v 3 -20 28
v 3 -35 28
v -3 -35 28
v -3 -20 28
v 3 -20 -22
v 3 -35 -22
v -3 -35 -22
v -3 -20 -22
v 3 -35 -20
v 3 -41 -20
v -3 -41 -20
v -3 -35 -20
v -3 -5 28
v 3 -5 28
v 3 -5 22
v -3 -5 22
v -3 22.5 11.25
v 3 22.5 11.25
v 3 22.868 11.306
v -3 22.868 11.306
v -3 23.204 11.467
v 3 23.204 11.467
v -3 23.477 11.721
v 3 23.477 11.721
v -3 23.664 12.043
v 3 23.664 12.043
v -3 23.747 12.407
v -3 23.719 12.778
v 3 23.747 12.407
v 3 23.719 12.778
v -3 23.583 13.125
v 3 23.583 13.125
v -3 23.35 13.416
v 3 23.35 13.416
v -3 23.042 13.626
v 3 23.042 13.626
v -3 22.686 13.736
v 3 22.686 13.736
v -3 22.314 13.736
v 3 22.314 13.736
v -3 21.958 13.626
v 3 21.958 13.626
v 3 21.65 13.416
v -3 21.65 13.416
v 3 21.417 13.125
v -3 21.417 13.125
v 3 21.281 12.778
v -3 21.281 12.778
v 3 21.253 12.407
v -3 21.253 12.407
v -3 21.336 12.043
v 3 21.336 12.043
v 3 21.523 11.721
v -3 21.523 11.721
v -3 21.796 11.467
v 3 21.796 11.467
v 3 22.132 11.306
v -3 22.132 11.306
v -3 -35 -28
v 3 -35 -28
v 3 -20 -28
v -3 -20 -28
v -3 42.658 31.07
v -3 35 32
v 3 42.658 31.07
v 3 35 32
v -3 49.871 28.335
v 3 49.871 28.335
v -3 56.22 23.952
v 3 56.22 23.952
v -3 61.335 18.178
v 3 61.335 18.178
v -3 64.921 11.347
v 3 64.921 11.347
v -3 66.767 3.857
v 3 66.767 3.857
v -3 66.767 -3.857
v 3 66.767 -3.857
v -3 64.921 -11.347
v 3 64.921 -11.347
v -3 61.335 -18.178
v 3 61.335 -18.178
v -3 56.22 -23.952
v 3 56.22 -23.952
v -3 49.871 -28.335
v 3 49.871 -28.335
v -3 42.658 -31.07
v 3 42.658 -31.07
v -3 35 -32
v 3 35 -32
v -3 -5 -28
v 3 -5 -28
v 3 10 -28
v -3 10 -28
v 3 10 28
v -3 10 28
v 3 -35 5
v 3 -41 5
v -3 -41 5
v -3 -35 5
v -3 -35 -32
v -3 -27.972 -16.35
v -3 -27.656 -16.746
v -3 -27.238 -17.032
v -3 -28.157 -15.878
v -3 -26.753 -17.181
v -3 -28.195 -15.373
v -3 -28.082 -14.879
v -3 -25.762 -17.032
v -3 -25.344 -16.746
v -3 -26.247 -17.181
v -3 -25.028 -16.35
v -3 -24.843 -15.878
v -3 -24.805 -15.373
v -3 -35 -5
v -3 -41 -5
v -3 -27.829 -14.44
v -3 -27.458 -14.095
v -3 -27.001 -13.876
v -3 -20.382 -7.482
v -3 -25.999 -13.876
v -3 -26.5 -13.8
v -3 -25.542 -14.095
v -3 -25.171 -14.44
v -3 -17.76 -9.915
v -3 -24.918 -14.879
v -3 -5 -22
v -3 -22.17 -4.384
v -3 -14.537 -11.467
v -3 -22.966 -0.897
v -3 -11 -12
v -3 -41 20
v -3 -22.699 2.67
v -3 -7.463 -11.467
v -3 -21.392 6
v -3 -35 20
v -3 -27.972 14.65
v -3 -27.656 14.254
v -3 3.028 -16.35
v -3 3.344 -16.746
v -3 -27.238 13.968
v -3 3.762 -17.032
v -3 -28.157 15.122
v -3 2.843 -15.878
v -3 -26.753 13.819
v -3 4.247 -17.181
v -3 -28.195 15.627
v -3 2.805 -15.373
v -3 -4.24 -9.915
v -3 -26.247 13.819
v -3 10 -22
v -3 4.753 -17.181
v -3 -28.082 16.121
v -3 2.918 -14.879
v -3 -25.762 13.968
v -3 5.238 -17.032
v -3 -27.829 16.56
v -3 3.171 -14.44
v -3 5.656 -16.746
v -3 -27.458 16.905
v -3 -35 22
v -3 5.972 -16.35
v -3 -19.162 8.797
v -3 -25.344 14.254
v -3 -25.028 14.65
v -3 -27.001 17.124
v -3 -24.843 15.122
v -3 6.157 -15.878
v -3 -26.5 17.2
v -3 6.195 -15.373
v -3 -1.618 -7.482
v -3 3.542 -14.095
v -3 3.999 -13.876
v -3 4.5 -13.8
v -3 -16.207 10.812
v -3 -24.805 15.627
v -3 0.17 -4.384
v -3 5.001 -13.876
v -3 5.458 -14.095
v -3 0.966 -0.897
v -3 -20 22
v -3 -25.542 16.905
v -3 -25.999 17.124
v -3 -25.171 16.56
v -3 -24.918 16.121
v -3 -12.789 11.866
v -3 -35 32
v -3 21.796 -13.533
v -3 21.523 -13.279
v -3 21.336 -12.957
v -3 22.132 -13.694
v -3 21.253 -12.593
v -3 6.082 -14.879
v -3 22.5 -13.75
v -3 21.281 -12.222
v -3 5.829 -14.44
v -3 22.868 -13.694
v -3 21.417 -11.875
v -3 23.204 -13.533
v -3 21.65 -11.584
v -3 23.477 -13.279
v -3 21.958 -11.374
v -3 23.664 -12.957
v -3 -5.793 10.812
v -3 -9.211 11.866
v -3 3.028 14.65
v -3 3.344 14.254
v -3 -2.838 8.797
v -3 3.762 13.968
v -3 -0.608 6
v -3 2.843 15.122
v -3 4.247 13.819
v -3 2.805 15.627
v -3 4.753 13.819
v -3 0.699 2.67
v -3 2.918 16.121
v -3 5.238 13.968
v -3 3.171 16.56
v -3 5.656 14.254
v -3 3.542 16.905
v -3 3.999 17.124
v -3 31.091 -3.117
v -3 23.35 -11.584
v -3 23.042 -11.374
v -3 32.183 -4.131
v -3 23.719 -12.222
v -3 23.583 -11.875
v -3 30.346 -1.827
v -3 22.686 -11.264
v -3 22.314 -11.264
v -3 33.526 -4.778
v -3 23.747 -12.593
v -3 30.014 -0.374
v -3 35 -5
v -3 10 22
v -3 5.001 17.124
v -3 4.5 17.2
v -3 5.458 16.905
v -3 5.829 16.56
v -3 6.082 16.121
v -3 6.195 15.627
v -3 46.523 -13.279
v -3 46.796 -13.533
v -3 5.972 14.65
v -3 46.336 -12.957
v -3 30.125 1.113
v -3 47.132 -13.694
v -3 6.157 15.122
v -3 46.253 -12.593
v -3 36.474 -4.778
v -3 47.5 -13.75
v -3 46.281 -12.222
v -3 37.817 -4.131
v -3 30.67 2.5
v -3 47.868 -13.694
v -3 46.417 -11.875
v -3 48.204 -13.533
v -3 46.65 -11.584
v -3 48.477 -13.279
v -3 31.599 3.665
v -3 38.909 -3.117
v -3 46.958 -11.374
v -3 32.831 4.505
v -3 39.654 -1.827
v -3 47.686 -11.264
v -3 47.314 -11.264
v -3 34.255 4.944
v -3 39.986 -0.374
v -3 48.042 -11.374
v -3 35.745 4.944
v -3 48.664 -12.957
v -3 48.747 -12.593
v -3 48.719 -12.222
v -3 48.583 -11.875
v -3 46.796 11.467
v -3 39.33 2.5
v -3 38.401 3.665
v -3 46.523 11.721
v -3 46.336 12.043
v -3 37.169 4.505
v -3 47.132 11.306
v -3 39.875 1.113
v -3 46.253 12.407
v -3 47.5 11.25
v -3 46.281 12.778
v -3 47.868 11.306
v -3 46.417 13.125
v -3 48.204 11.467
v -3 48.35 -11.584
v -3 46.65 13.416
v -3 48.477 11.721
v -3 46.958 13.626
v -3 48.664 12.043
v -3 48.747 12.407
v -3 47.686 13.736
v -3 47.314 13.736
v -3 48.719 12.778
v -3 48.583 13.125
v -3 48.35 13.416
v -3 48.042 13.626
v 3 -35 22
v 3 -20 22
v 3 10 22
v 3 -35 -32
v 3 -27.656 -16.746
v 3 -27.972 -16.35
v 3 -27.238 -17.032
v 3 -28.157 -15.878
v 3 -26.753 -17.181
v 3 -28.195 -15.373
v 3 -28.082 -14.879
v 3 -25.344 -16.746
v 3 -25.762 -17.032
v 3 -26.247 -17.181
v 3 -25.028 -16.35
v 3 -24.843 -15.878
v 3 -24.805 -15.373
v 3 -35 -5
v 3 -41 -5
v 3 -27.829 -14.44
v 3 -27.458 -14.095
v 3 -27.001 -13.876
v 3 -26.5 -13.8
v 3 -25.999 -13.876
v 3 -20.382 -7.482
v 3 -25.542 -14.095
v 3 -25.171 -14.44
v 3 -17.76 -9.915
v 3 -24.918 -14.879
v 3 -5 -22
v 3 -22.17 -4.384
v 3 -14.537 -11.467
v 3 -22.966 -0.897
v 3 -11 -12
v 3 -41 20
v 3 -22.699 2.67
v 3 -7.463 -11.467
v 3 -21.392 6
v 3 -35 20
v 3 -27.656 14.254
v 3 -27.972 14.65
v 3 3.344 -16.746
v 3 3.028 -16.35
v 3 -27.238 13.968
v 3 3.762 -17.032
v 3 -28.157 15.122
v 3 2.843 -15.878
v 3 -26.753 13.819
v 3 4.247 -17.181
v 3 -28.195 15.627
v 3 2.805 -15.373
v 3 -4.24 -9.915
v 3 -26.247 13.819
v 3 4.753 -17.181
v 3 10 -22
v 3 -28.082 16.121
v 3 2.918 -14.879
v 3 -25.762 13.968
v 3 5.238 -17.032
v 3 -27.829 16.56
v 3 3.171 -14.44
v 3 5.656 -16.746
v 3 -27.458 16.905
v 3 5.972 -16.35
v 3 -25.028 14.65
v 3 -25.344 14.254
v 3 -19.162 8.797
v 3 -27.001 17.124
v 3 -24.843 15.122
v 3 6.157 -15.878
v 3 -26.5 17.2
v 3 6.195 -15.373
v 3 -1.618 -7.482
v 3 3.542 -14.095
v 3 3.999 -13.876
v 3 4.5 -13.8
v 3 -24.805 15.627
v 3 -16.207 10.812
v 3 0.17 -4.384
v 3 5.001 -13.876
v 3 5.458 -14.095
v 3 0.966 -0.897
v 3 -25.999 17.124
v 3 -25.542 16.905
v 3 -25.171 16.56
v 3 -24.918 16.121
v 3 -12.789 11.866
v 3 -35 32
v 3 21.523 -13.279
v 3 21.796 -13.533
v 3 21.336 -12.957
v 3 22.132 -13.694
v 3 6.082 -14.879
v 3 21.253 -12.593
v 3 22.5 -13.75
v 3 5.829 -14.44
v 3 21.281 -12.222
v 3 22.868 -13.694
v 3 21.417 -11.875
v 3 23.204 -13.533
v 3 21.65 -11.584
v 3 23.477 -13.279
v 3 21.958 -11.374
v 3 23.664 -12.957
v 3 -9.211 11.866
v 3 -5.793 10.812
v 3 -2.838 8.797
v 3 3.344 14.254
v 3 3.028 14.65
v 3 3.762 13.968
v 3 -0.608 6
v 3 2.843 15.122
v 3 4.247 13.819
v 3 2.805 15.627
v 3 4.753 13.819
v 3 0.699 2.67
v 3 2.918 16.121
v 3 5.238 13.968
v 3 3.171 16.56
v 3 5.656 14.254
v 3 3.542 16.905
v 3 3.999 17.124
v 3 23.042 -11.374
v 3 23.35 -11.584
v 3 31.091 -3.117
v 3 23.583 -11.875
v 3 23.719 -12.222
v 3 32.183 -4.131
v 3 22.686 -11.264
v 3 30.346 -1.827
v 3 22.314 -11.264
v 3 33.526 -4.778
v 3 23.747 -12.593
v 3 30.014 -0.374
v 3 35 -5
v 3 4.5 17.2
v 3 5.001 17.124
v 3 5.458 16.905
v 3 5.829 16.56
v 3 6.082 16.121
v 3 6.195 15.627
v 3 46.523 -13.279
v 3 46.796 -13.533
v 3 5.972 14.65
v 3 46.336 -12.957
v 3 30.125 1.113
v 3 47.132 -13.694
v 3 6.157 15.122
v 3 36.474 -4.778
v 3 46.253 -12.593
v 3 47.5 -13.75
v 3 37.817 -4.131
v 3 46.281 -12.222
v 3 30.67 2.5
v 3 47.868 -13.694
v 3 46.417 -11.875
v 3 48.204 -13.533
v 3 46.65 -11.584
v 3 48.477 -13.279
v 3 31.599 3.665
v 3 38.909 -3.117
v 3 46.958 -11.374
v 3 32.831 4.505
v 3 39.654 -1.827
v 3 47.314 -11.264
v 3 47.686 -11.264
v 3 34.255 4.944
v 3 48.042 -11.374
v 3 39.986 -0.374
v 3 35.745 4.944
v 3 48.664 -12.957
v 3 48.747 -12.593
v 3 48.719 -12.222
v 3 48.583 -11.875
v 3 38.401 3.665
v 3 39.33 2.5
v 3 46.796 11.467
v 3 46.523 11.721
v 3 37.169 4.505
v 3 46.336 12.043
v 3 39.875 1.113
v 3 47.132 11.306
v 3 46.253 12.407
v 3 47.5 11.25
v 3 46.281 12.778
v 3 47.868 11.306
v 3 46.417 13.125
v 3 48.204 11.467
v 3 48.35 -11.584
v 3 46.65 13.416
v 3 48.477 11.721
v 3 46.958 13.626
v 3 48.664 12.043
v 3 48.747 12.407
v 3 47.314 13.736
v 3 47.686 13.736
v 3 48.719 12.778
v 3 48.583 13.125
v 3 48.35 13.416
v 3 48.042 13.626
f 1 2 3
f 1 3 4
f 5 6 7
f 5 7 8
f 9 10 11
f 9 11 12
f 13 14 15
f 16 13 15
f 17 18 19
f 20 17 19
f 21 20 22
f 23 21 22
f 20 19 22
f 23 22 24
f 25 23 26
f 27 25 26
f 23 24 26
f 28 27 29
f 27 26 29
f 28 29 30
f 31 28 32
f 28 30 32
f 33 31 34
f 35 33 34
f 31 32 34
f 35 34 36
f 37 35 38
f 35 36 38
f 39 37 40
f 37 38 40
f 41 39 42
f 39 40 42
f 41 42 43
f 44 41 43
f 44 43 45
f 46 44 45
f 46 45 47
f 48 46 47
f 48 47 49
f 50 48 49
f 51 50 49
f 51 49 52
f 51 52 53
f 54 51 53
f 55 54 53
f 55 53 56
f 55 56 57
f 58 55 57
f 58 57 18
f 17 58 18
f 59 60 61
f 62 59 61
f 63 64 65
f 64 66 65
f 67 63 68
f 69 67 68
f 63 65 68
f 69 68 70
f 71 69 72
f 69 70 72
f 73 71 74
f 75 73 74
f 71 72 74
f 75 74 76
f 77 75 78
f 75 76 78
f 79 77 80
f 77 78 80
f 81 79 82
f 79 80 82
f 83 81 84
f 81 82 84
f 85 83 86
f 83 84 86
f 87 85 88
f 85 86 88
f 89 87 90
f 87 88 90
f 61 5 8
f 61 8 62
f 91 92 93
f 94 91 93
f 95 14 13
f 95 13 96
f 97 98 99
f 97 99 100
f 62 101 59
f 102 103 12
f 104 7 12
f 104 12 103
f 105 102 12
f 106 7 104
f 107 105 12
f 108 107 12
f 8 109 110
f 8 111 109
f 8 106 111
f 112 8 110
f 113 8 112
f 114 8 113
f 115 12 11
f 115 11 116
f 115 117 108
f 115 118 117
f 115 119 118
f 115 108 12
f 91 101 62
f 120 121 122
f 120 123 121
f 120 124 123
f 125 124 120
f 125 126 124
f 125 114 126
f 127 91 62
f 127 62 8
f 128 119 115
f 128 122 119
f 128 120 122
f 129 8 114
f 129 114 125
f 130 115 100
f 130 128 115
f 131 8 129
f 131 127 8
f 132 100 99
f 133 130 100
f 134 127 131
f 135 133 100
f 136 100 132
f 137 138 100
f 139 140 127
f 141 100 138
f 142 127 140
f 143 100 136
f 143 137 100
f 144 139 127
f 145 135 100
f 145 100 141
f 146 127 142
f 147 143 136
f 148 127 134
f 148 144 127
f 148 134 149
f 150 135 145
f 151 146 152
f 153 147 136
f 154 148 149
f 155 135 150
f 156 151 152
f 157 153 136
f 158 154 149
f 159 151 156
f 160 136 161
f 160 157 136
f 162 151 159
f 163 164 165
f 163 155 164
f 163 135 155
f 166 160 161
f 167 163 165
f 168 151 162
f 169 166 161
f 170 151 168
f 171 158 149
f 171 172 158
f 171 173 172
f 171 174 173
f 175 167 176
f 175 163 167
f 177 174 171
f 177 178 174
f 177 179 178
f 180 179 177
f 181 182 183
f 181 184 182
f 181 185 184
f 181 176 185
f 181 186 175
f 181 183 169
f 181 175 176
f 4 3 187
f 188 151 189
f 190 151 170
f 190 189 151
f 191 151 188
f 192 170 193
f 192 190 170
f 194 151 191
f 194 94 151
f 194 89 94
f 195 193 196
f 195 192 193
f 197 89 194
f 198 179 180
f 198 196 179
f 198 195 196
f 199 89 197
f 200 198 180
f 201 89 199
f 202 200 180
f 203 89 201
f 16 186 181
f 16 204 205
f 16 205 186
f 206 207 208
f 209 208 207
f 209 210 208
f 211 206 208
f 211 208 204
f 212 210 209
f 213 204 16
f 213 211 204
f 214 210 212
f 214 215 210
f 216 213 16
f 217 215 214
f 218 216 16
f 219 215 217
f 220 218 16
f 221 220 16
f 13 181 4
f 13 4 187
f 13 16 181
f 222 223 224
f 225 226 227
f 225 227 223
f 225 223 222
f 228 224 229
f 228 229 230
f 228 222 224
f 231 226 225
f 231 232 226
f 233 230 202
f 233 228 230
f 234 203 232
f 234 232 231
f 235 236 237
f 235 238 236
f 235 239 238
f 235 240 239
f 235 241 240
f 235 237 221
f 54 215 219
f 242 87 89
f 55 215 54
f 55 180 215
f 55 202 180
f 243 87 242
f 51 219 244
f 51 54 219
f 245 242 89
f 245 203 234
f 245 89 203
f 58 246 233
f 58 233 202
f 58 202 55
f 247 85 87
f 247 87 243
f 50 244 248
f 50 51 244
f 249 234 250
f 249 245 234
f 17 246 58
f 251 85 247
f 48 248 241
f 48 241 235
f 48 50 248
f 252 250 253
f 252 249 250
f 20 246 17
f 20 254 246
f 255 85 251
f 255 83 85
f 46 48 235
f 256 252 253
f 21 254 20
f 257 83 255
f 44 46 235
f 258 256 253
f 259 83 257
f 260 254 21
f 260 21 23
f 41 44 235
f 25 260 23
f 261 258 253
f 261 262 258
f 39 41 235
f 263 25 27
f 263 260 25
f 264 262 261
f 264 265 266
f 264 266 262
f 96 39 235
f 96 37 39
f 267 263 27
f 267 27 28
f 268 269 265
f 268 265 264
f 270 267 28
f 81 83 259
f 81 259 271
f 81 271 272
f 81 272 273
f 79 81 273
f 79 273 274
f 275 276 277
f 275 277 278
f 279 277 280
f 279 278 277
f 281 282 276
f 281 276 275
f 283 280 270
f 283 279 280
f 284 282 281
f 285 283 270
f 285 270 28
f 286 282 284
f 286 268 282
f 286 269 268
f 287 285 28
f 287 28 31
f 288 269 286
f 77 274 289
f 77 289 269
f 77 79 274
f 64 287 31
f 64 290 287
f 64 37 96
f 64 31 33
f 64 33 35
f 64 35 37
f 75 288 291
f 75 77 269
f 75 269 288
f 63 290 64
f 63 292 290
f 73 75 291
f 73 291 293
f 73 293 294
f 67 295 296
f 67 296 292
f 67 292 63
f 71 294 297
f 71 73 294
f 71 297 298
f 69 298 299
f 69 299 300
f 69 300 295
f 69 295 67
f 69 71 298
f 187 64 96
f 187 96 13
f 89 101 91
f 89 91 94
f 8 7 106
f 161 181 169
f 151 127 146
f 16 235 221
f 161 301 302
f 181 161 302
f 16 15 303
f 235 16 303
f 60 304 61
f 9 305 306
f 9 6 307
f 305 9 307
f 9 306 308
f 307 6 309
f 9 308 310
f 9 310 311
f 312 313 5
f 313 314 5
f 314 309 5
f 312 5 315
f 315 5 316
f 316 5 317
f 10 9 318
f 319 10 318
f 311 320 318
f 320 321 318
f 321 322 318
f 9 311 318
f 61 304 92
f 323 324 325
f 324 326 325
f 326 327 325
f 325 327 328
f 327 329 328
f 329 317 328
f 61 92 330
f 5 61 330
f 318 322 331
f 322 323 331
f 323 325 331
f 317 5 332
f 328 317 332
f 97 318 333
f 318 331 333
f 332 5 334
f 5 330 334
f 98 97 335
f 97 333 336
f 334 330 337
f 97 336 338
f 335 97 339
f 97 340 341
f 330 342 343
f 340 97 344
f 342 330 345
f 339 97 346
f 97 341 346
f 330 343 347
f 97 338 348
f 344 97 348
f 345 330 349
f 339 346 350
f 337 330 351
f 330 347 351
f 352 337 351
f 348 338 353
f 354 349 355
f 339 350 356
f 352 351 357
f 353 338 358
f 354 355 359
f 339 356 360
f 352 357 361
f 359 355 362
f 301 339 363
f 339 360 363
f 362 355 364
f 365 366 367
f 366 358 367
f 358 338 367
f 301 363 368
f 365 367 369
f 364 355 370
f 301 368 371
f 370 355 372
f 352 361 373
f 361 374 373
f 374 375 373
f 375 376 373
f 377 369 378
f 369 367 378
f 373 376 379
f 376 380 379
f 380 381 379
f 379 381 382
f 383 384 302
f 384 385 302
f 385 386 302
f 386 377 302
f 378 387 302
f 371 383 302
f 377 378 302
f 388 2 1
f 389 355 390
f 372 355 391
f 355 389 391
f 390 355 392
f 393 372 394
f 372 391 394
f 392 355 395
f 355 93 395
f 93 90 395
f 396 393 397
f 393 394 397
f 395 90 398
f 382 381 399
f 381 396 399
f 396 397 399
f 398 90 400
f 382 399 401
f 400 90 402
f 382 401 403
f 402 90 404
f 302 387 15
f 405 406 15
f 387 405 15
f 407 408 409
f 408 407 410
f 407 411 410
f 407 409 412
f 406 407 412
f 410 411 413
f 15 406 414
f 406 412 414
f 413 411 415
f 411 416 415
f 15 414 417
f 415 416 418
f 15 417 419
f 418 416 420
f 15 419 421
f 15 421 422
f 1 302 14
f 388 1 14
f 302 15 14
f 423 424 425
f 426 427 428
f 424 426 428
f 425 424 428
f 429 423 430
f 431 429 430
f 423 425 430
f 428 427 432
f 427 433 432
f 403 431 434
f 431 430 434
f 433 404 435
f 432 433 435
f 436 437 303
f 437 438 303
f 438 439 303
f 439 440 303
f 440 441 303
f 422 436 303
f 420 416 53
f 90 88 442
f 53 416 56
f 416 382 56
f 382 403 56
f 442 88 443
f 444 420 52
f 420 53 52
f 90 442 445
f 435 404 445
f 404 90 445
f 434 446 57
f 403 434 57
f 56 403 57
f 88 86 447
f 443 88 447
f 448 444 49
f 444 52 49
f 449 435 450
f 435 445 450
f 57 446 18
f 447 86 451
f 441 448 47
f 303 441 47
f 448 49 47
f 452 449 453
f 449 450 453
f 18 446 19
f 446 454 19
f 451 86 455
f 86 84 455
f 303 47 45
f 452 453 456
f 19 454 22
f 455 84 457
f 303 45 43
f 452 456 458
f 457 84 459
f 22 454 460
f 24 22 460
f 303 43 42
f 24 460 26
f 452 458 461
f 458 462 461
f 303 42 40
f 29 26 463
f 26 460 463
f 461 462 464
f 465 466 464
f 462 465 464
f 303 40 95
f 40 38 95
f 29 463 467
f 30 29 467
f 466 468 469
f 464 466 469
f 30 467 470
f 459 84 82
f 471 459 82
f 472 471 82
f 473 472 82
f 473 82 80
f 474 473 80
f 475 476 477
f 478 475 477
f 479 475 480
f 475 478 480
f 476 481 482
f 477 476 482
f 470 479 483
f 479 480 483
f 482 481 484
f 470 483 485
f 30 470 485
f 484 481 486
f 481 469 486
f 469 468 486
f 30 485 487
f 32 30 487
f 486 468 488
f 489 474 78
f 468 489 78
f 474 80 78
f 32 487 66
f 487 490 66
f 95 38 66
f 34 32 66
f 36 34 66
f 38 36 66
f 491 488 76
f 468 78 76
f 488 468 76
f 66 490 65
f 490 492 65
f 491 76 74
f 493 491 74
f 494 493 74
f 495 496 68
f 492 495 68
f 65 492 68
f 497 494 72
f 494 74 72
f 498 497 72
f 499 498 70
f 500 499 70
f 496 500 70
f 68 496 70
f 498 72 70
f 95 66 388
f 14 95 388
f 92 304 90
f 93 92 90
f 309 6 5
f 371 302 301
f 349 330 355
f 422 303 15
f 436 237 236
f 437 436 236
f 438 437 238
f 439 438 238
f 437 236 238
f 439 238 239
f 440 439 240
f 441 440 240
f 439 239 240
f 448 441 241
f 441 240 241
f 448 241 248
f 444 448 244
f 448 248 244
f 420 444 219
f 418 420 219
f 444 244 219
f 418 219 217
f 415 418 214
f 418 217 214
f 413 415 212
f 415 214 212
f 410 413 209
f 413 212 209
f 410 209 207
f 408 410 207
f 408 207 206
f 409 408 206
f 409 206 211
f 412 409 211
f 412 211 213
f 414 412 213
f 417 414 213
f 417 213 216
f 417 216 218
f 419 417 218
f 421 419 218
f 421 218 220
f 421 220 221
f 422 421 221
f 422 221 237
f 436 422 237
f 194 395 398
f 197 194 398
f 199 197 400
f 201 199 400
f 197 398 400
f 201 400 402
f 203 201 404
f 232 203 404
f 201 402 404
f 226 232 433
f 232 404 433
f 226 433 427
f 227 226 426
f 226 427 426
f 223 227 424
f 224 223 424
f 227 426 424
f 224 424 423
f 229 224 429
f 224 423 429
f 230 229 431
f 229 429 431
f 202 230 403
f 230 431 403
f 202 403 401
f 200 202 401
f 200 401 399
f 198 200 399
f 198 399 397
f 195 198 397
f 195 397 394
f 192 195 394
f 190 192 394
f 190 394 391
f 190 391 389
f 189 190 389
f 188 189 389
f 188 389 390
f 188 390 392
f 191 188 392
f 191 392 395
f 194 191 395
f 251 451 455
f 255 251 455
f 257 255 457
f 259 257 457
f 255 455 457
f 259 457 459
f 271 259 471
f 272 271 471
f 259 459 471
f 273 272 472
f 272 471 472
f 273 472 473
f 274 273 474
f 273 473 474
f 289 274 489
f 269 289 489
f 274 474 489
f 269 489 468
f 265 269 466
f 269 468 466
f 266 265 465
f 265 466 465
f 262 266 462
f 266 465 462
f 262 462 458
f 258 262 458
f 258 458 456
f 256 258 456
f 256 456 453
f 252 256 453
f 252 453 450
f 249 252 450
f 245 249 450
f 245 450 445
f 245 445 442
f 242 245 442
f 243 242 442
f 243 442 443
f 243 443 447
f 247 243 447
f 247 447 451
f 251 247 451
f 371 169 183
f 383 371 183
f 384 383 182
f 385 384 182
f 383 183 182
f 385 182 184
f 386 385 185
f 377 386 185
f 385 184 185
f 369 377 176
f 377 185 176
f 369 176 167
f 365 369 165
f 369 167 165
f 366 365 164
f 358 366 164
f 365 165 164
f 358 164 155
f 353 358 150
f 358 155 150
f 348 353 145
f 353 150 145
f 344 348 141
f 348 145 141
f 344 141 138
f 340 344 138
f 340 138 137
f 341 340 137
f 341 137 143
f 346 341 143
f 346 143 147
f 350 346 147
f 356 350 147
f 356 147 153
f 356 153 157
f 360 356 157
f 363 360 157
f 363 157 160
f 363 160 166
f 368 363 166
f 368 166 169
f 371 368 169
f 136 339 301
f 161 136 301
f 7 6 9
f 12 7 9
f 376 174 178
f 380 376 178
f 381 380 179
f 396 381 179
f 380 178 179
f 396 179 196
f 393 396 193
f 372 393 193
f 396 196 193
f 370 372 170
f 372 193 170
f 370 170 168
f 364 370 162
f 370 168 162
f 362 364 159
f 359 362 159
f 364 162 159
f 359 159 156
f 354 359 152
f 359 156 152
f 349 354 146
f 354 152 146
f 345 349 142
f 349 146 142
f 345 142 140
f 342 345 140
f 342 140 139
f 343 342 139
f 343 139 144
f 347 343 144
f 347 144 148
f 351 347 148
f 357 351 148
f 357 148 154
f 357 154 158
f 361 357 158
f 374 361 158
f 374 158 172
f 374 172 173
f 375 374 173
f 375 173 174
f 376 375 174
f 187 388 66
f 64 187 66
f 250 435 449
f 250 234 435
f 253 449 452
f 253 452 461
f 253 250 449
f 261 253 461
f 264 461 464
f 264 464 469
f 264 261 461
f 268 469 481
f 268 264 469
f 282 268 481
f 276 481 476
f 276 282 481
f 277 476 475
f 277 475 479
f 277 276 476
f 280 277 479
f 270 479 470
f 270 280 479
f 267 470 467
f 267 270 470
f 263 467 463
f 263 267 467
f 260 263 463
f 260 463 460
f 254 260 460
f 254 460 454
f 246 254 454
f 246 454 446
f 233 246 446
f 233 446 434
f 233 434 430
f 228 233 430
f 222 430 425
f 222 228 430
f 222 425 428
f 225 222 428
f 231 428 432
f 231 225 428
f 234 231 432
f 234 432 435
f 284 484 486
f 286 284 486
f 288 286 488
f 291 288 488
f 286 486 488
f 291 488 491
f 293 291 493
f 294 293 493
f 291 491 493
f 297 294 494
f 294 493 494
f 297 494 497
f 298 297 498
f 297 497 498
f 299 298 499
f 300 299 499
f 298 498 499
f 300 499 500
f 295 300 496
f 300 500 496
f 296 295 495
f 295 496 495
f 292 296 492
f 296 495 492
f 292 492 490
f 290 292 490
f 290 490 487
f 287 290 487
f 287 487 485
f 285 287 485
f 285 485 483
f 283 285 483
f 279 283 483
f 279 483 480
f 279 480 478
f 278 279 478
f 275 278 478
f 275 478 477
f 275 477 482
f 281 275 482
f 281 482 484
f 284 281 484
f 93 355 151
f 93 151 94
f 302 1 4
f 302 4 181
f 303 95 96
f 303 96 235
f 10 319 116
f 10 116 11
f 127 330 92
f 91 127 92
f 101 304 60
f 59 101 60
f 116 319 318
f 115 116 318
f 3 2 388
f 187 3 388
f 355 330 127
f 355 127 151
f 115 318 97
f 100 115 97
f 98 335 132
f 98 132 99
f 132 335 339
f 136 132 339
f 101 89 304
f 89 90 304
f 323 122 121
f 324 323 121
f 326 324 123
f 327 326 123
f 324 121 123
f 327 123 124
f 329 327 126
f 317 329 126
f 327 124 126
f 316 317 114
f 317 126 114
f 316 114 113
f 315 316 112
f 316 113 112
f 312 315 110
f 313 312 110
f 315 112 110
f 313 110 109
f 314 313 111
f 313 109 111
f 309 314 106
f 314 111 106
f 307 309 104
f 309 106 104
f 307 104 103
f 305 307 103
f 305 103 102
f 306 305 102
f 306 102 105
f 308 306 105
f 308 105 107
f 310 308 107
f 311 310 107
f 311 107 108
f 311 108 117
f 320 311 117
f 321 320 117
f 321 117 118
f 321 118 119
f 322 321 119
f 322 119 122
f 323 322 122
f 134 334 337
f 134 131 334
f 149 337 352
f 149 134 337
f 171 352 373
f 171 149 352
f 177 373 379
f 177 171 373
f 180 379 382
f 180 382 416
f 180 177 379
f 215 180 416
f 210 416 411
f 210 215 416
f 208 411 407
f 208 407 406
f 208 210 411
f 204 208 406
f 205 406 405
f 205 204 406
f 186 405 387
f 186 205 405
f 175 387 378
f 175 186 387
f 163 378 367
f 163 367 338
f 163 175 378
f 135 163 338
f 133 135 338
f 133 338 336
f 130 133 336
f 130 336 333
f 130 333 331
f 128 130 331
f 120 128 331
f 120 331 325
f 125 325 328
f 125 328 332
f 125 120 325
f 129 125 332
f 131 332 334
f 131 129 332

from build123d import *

# Parameters (mm, degrees)
CROQUIS1_R                   = 5
CROQUIS1_R_2                 = 12
SALIENTE_EXTRUIR1_DEPTH      = 3
TALADRO_DE_MARGEN_PARA_M32_D = 3.4
TALADRO_ROSCADO_M3X0_51_D    = 2.5
CROQUIS8_W                   = 6
CROQUIS8_H                   = 15
CORTAR_EXTRUIR1_DEPTH        = 75.491610266
CROQUIS9_W                   = 15
CROQUIS9_H                   = 6
SALIENTE_EXTRUIR3_DEPTH      = 6


with BuildPart() as part:
    # Croquis1 → Saliente-Extruir1 (new, symmetric)
    with BuildSketch(Plane(origin=(0, 0, 0), x_dir=(0, 0, -1), z_dir=(1, 0, 0))):
        with BuildLine():
            Line((-32, -35), (-32, 35))
            ThreePointArc((-32, 35), (0, 67), (32, 35))
            Line((32, 35), (32, -35))
            Line((32, -35), (-32, -35))
        make_face()
        with Locations((0, 35)):
            Circle(CROQUIS1_R, mode=Mode.SUBTRACT)
        with Locations((0, -11)):
            Circle(CROQUIS1_R_2, mode=Mode.SUBTRACT)
    extrude(amount=SALIENTE_EXTRUIR1_DEPTH, both=True)

    # Taladro de margen para M32 (through all)
    with Locations(Plane(origin=(3, 0, 0), x_dir=(0, 0, -1), z_dir=(1, 0, 0))):
        with Locations((-15.5, 4.5), (-15.5, -26.5), (15.5, -26.5), (15.5, 4.5)):
            Hole(TALADRO_DE_MARGEN_PARA_M32_D / 2)

    # Taladro roscado M3x0.51 (through all)
    with Locations(Plane.ZY.offset(3)):
        with Locations((-12.5, 22.5), (-12.5, 47.5), (12.5, 47.5), (12.5, 22.5)):
            Hole(TALADRO_ROSCADO_M3X0_51_D / 2)

    # Croquis8 → Cortar-Extruir1 (cut, through all)
    with BuildSketch(Plane(origin=(3, 0, 0), x_dir=(0, 0, -1), z_dir=(1, 0, 0))):
        with Locations((-25, 2.5)):
            Rectangle(CROQUIS8_W, CROQUIS8_H)
        with Locations((-25, -27.5)):
            Rectangle(CROQUIS8_W, CROQUIS8_H)
        with Locations((25, -27.5)):
            Rectangle(CROQUIS8_W, CROQUIS8_H)
        with Locations((25, 2.5)):
            Rectangle(CROQUIS8_W, CROQUIS8_H)
    extrude(amount=-CORTAR_EXTRUIR1_DEPTH, mode=Mode.SUBTRACT)

    # Croquis9 → Saliente-Extruir3 (add, through all)
    with BuildSketch(Plane(origin=(3, 0, 0), x_dir=(0, 0, -1), z_dir=(1, 0, 0))):
        with Locations((-12.5, -38)):
            Rectangle(CROQUIS9_W, CROQUIS9_H)
        with Locations((12.5, -38)):
            Rectangle(CROQUIS9_W, CROQUIS9_H)
    extrude(amount=-SALIENTE_EXTRUIR3_DEPTH)


solid = part.part
